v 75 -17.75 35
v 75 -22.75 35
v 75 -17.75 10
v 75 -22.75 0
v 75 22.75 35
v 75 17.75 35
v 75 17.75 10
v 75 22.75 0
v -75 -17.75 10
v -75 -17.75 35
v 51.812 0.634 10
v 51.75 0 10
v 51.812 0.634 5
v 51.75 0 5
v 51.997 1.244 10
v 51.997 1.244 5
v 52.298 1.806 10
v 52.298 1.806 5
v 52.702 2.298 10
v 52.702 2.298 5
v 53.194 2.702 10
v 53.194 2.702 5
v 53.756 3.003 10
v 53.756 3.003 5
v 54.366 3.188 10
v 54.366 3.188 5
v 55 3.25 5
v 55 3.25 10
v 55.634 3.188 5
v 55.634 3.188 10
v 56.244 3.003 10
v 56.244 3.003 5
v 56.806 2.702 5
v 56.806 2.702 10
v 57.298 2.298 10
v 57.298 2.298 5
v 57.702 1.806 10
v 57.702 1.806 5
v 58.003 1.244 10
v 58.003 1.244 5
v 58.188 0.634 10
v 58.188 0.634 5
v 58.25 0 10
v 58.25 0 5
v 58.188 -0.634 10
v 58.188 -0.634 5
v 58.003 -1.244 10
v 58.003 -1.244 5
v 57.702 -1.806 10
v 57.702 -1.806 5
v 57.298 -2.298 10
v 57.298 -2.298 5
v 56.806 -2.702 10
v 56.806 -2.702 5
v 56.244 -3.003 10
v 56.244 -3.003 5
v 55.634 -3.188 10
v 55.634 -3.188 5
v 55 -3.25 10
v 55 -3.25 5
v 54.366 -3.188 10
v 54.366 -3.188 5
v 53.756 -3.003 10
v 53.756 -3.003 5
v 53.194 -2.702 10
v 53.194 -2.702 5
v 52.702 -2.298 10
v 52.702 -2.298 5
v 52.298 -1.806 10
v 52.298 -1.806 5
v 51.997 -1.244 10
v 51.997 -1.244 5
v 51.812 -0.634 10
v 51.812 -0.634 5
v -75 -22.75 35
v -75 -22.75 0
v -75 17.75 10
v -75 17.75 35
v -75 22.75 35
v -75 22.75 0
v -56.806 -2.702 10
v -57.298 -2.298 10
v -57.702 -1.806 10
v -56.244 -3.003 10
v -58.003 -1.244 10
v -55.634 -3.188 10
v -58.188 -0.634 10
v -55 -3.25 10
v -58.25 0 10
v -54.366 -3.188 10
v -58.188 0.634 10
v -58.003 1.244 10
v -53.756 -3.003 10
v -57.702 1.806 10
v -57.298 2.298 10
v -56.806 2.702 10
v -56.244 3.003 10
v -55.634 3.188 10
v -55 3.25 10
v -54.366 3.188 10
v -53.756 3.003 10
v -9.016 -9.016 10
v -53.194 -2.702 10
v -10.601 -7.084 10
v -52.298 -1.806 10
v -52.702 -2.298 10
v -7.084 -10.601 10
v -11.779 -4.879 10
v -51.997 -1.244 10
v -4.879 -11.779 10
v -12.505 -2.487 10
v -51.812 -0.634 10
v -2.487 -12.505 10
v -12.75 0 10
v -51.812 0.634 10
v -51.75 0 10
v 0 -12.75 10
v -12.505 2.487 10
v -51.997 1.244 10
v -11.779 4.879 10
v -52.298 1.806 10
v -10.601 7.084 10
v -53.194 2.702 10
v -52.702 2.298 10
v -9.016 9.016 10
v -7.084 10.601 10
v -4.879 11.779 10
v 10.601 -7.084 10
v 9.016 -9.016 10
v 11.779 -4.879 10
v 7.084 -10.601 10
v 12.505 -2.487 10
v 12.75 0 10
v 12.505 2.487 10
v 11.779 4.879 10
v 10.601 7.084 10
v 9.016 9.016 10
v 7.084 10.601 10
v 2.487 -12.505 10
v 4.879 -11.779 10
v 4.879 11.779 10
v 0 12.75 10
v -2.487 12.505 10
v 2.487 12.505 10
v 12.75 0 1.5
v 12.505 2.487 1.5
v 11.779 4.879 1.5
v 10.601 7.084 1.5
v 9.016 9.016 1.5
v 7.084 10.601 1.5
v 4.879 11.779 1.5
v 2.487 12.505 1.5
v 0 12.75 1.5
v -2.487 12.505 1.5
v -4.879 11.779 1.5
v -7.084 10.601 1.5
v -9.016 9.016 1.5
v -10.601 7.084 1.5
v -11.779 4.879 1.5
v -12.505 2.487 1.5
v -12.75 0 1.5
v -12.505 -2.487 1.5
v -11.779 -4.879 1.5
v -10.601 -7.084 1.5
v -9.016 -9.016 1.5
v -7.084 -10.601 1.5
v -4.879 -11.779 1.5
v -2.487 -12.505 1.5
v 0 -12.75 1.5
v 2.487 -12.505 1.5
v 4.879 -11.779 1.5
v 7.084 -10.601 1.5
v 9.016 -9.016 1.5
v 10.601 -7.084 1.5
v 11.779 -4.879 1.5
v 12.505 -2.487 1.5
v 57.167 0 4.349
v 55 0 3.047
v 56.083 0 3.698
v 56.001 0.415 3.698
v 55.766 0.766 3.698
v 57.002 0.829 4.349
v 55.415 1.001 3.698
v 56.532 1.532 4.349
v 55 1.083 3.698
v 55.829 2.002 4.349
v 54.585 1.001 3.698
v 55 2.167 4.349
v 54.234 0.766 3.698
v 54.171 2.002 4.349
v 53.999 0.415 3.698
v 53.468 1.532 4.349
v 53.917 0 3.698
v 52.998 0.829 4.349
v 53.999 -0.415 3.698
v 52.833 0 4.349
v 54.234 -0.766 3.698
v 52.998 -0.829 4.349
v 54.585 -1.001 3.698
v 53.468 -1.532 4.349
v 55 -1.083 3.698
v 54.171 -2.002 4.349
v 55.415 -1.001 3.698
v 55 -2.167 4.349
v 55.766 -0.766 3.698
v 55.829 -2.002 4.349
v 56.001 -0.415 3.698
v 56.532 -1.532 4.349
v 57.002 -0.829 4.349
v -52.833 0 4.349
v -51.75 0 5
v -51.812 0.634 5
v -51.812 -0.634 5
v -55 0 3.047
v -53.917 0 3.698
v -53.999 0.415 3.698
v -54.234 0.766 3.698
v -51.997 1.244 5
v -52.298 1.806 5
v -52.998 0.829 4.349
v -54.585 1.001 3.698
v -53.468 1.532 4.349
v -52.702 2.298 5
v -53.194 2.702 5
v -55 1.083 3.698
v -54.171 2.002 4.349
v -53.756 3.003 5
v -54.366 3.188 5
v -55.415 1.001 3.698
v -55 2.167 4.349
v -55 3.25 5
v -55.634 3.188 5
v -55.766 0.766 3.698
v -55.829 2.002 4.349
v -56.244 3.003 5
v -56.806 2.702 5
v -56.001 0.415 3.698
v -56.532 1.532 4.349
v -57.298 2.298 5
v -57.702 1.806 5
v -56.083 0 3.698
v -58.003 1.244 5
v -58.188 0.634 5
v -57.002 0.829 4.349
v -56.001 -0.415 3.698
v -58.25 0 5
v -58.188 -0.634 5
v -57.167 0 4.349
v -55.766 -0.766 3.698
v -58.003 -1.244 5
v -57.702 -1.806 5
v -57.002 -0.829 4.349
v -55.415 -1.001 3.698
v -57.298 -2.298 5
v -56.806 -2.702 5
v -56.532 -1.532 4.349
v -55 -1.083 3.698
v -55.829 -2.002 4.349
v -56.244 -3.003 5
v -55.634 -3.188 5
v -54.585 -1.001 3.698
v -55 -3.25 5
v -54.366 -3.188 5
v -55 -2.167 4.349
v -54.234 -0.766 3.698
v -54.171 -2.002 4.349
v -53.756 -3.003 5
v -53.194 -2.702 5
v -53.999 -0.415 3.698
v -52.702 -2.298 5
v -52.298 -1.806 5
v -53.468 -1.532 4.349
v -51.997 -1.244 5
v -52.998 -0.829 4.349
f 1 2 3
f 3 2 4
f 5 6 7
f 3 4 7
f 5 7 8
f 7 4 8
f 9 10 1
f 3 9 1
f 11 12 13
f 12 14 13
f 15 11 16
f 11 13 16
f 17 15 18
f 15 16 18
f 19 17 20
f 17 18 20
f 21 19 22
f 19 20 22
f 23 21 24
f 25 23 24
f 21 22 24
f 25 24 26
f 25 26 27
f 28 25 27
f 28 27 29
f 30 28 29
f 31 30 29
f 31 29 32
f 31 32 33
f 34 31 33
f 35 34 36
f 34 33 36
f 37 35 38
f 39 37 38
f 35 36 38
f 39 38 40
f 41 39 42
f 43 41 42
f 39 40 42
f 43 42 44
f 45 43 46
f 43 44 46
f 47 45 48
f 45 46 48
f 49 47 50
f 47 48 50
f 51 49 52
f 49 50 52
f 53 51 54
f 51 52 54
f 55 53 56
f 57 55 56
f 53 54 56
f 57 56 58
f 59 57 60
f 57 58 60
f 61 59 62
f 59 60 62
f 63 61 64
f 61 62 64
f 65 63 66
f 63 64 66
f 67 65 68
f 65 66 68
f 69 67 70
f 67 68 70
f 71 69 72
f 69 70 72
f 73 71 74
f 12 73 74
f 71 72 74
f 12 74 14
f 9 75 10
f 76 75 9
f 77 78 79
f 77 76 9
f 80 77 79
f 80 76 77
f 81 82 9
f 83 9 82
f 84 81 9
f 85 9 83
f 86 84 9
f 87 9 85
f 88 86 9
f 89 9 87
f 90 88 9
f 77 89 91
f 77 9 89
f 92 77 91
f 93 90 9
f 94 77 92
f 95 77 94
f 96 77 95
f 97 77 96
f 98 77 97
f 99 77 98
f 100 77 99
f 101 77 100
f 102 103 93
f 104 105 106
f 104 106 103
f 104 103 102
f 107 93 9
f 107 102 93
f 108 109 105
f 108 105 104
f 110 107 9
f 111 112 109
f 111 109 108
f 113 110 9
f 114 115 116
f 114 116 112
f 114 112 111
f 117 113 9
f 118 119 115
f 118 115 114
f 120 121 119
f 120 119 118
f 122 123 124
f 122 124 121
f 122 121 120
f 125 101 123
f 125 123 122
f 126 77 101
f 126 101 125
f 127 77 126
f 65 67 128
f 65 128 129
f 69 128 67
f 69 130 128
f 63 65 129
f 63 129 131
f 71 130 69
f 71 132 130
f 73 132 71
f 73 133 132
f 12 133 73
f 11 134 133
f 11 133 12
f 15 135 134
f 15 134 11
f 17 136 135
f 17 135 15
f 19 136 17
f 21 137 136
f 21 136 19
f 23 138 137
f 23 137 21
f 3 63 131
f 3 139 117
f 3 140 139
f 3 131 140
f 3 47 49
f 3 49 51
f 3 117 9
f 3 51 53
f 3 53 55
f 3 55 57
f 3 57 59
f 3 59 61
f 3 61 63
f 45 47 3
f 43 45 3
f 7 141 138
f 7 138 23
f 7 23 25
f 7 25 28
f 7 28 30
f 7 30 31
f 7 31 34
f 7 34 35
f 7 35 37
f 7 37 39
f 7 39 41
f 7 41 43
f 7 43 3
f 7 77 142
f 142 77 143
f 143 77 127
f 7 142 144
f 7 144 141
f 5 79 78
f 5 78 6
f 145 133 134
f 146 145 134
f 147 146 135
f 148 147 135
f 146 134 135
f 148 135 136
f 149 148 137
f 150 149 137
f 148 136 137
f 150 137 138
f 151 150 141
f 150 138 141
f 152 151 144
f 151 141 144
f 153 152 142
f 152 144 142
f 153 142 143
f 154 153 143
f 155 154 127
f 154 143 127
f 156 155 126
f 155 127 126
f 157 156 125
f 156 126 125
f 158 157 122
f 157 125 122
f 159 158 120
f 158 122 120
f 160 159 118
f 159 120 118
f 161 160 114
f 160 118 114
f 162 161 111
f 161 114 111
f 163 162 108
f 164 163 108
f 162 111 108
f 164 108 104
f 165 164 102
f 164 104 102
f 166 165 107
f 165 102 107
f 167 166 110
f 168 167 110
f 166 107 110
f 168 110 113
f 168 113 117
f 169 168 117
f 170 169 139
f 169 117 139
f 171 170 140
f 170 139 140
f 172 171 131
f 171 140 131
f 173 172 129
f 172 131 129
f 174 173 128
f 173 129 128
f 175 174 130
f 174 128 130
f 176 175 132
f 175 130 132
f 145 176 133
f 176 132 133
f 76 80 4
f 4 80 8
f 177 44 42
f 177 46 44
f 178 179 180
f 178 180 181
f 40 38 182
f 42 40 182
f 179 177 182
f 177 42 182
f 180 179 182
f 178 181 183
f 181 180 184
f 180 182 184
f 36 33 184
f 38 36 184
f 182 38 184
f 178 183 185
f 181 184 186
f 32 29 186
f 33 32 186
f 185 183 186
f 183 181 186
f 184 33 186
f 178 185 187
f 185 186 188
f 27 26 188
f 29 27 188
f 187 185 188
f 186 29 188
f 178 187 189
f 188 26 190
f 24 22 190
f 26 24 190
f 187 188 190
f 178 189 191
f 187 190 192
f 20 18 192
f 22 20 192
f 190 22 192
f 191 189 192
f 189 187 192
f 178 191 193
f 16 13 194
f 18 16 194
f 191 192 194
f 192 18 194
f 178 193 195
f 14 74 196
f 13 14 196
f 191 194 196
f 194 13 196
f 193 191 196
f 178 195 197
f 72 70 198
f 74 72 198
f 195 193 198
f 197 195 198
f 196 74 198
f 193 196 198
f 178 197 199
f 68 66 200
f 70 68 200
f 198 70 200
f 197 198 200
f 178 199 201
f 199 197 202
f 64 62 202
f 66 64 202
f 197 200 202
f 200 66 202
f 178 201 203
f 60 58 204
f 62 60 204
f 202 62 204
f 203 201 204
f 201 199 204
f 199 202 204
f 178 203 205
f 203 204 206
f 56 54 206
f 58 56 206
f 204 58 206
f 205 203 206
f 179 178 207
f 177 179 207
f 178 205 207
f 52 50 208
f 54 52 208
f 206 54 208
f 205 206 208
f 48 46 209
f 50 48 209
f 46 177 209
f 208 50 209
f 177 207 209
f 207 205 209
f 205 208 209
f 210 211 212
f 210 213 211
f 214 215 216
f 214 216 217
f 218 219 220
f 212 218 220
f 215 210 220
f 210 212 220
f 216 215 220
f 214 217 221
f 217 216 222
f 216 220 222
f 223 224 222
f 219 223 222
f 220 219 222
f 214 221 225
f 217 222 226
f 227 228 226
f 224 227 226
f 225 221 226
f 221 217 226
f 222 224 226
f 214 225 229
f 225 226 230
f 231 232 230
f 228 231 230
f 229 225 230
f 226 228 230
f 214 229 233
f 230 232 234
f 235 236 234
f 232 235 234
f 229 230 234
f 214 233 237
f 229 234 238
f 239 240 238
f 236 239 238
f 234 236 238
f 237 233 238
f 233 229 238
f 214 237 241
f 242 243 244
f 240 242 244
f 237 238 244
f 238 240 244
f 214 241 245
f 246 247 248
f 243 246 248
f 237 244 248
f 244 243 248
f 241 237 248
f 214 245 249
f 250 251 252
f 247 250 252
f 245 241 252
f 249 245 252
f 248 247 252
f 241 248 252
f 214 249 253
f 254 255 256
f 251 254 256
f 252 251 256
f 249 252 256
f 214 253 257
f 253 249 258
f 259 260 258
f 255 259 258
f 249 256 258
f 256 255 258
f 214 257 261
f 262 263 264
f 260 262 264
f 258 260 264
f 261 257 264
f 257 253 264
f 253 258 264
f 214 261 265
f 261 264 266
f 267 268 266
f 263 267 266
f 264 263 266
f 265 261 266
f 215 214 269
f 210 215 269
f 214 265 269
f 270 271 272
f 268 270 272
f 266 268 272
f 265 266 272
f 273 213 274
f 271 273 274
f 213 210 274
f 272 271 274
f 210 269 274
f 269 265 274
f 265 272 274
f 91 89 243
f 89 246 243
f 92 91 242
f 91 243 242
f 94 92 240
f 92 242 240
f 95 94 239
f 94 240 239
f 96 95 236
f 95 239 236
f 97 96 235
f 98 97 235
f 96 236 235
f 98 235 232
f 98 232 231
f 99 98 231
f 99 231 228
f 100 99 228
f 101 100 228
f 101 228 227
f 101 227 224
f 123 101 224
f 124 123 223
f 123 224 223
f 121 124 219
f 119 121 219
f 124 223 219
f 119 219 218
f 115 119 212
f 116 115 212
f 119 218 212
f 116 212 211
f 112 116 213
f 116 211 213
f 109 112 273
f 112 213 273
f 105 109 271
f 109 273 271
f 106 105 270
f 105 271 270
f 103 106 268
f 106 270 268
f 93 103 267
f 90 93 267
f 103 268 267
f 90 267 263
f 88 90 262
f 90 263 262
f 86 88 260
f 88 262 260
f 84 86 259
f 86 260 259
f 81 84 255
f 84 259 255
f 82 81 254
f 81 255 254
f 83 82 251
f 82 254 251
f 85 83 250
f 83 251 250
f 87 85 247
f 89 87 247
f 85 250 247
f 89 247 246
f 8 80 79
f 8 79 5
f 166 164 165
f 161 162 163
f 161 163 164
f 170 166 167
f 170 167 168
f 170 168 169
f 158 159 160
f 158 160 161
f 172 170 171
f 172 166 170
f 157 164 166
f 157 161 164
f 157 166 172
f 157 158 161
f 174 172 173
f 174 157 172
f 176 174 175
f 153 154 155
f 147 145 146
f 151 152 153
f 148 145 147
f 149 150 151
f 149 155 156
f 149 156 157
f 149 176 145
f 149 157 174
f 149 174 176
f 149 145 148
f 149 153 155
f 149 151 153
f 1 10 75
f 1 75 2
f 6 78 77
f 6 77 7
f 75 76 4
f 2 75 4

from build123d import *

# Parameters (mm, degrees)
F0_W     = 150
F0_H     = 45.5
F1_DEPTH = 35
F2_W     = 150
F2_H     = 35.5
F3_DEPTH = 25
F4_R     = 12.75
F5_DEPTH = 8.5
F6_D     = 6.5
F6_DEPTH = 5
F6_TIP   = 1.9527970118


with BuildPart() as f1:
    # F0 (on Top) → F1 (new body)
    with BuildSketch(Plane.XY):
        Rectangle(F0_W, F0_H)
    extrude(amount=F1_DEPTH)

    # F2 (on face) → F3 (cut)
    with BuildSketch(Plane.XY.offset(35)):
        Rectangle(F2_W, F2_H)
    extrude(amount=-F3_DEPTH, mode=Mode.SUBTRACT)

    # F4 (on face) → F5 (cut)
    with BuildSketch(Plane.XY.offset(10)):
        Circle(F4_R)
    extrude(amount=-F5_DEPTH, mode=Mode.SUBTRACT)

    # F6
    with Locations(Plane.XY.offset(10)):
        with Locations((55, 0), (-55, 0)):
            Hole(F6_D / 2, depth=F6_DEPTH)
            with Locations((0, 0, -(F6_DEPTH + F6_TIP / 2))):  # 118° drill point
                Cone(0, F6_D / 2, F6_TIP, mode=Mode.SUBTRACT)


solid = f1.part
